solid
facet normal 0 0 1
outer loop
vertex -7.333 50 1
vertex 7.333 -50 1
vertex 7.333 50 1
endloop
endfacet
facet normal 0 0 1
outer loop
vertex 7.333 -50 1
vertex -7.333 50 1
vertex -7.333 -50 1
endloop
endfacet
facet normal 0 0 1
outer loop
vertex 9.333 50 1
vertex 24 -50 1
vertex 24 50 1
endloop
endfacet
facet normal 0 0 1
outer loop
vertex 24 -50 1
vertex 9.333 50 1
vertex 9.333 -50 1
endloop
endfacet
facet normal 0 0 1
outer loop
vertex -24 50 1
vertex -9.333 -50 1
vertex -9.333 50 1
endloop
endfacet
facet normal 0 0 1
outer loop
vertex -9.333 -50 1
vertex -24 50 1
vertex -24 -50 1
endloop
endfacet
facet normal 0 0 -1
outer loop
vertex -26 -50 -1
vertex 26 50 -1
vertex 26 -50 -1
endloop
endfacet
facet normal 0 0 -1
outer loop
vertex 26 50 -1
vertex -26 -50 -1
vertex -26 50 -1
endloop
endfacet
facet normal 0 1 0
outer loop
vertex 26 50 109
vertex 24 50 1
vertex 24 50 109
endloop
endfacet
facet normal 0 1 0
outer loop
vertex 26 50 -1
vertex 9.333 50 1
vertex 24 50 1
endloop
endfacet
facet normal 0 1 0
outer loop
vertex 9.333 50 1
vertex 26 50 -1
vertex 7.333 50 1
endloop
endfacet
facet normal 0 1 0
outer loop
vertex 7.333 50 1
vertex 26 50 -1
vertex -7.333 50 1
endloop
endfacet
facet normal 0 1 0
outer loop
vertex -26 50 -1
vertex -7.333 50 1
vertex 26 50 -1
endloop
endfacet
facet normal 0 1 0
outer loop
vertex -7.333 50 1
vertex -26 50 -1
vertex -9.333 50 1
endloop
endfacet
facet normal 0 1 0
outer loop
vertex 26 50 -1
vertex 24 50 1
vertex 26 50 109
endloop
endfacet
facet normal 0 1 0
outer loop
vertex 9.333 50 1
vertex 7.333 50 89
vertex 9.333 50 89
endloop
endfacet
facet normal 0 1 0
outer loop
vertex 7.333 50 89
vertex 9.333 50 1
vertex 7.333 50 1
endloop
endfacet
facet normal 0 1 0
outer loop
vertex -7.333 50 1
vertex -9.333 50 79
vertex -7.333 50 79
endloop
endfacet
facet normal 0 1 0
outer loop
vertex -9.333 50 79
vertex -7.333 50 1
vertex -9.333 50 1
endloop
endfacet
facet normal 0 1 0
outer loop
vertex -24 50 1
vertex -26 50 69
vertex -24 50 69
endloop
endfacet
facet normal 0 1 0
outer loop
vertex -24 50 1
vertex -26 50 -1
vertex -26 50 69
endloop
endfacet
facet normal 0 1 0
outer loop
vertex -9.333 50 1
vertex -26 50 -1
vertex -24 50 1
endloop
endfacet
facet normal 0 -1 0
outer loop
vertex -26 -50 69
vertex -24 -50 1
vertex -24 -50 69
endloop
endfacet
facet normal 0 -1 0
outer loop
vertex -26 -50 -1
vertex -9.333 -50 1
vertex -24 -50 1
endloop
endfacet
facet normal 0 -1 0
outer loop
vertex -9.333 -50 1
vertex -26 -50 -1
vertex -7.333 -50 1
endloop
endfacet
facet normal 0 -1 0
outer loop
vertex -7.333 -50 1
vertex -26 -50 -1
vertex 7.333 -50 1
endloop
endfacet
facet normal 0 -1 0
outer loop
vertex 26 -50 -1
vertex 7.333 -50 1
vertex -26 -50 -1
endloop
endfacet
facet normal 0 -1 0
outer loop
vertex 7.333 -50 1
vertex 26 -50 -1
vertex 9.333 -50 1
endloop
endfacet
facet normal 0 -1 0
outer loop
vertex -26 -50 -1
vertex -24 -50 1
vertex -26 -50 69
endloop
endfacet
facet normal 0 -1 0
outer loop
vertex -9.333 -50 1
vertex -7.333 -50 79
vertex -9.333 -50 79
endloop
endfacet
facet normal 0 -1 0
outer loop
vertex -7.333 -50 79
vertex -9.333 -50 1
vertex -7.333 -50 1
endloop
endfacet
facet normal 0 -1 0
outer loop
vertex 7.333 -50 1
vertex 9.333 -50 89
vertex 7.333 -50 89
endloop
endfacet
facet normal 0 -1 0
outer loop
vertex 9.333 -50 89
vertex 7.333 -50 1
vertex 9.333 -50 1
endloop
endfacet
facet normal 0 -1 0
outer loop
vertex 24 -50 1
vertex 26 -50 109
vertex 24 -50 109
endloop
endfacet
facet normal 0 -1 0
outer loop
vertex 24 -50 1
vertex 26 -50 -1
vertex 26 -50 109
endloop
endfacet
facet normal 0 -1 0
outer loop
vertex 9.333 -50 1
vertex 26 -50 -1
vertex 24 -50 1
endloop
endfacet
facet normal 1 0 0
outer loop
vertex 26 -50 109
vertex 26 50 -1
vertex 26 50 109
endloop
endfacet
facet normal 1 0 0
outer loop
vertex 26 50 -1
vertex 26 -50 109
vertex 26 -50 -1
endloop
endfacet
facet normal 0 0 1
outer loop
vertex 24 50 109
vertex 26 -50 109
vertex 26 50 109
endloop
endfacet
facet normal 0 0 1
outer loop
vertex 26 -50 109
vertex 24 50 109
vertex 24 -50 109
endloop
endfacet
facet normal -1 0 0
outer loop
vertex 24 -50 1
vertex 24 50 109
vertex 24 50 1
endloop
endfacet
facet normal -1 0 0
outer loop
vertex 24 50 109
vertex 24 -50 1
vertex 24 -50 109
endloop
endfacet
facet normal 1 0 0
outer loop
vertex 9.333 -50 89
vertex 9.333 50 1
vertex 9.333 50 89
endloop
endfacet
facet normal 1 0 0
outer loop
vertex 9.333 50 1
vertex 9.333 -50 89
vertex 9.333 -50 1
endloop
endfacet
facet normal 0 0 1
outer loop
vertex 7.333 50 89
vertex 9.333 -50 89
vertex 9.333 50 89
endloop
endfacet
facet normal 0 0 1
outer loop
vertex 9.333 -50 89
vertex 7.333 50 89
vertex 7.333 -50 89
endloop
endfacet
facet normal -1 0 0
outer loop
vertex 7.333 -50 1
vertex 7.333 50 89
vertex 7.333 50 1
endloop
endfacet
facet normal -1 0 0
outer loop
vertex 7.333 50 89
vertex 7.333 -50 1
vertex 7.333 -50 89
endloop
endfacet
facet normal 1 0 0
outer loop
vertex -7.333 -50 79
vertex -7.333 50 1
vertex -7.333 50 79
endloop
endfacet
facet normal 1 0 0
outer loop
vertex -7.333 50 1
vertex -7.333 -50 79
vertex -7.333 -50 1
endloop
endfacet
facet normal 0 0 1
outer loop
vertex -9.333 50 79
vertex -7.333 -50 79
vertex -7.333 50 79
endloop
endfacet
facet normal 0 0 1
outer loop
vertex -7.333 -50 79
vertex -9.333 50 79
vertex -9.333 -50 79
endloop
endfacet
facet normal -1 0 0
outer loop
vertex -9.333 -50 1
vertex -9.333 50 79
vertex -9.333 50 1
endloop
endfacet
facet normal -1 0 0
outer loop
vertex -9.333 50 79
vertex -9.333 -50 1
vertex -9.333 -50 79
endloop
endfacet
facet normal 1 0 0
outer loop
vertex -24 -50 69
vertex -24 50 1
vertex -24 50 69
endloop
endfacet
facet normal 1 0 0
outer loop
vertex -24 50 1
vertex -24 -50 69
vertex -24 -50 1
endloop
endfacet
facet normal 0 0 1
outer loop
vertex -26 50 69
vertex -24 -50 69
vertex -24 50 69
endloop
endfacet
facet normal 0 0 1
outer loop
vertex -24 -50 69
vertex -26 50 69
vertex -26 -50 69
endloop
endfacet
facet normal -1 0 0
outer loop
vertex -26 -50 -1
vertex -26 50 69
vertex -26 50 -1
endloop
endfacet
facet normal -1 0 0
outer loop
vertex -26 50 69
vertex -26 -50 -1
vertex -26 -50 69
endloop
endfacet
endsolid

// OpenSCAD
// thickness of the wall in mm
Wall_thickness = 2;
// legth of the rack in mm
Length = 50;
// width in mm
Width = 100;
// height of the heighest rack
height = 70;
union(){
  cube([Length, Width, Wall_thickness], center=true);
  translate([(Length / 2), 0, (height / 2 + 19)]){
    rotate([0, 0, 0]){
      cube([Wall_thickness, Width, (height + 40)], center=true);
    }
  }
  translate([(Length / 6), 0, (height / 2 + 9)]){
    rotate([0, 0, 0]){
      cube([Wall_thickness, Width, (height + 20)], center=true);
    }
  }
  translate([(Length / -6), 0, (height / 2 + 4)]){
    rotate([0, 0, 0]){
      cube([Wall_thickness, Width, (height + 10)], center=true);
    }
  }
  translate([(Length / -2), 0, (height / 2 - 1)]){
    rotate([0, 0, 0]){
      cube([Wall_thickness, Width, (height + 0)], center=true);
    }
  }
}
